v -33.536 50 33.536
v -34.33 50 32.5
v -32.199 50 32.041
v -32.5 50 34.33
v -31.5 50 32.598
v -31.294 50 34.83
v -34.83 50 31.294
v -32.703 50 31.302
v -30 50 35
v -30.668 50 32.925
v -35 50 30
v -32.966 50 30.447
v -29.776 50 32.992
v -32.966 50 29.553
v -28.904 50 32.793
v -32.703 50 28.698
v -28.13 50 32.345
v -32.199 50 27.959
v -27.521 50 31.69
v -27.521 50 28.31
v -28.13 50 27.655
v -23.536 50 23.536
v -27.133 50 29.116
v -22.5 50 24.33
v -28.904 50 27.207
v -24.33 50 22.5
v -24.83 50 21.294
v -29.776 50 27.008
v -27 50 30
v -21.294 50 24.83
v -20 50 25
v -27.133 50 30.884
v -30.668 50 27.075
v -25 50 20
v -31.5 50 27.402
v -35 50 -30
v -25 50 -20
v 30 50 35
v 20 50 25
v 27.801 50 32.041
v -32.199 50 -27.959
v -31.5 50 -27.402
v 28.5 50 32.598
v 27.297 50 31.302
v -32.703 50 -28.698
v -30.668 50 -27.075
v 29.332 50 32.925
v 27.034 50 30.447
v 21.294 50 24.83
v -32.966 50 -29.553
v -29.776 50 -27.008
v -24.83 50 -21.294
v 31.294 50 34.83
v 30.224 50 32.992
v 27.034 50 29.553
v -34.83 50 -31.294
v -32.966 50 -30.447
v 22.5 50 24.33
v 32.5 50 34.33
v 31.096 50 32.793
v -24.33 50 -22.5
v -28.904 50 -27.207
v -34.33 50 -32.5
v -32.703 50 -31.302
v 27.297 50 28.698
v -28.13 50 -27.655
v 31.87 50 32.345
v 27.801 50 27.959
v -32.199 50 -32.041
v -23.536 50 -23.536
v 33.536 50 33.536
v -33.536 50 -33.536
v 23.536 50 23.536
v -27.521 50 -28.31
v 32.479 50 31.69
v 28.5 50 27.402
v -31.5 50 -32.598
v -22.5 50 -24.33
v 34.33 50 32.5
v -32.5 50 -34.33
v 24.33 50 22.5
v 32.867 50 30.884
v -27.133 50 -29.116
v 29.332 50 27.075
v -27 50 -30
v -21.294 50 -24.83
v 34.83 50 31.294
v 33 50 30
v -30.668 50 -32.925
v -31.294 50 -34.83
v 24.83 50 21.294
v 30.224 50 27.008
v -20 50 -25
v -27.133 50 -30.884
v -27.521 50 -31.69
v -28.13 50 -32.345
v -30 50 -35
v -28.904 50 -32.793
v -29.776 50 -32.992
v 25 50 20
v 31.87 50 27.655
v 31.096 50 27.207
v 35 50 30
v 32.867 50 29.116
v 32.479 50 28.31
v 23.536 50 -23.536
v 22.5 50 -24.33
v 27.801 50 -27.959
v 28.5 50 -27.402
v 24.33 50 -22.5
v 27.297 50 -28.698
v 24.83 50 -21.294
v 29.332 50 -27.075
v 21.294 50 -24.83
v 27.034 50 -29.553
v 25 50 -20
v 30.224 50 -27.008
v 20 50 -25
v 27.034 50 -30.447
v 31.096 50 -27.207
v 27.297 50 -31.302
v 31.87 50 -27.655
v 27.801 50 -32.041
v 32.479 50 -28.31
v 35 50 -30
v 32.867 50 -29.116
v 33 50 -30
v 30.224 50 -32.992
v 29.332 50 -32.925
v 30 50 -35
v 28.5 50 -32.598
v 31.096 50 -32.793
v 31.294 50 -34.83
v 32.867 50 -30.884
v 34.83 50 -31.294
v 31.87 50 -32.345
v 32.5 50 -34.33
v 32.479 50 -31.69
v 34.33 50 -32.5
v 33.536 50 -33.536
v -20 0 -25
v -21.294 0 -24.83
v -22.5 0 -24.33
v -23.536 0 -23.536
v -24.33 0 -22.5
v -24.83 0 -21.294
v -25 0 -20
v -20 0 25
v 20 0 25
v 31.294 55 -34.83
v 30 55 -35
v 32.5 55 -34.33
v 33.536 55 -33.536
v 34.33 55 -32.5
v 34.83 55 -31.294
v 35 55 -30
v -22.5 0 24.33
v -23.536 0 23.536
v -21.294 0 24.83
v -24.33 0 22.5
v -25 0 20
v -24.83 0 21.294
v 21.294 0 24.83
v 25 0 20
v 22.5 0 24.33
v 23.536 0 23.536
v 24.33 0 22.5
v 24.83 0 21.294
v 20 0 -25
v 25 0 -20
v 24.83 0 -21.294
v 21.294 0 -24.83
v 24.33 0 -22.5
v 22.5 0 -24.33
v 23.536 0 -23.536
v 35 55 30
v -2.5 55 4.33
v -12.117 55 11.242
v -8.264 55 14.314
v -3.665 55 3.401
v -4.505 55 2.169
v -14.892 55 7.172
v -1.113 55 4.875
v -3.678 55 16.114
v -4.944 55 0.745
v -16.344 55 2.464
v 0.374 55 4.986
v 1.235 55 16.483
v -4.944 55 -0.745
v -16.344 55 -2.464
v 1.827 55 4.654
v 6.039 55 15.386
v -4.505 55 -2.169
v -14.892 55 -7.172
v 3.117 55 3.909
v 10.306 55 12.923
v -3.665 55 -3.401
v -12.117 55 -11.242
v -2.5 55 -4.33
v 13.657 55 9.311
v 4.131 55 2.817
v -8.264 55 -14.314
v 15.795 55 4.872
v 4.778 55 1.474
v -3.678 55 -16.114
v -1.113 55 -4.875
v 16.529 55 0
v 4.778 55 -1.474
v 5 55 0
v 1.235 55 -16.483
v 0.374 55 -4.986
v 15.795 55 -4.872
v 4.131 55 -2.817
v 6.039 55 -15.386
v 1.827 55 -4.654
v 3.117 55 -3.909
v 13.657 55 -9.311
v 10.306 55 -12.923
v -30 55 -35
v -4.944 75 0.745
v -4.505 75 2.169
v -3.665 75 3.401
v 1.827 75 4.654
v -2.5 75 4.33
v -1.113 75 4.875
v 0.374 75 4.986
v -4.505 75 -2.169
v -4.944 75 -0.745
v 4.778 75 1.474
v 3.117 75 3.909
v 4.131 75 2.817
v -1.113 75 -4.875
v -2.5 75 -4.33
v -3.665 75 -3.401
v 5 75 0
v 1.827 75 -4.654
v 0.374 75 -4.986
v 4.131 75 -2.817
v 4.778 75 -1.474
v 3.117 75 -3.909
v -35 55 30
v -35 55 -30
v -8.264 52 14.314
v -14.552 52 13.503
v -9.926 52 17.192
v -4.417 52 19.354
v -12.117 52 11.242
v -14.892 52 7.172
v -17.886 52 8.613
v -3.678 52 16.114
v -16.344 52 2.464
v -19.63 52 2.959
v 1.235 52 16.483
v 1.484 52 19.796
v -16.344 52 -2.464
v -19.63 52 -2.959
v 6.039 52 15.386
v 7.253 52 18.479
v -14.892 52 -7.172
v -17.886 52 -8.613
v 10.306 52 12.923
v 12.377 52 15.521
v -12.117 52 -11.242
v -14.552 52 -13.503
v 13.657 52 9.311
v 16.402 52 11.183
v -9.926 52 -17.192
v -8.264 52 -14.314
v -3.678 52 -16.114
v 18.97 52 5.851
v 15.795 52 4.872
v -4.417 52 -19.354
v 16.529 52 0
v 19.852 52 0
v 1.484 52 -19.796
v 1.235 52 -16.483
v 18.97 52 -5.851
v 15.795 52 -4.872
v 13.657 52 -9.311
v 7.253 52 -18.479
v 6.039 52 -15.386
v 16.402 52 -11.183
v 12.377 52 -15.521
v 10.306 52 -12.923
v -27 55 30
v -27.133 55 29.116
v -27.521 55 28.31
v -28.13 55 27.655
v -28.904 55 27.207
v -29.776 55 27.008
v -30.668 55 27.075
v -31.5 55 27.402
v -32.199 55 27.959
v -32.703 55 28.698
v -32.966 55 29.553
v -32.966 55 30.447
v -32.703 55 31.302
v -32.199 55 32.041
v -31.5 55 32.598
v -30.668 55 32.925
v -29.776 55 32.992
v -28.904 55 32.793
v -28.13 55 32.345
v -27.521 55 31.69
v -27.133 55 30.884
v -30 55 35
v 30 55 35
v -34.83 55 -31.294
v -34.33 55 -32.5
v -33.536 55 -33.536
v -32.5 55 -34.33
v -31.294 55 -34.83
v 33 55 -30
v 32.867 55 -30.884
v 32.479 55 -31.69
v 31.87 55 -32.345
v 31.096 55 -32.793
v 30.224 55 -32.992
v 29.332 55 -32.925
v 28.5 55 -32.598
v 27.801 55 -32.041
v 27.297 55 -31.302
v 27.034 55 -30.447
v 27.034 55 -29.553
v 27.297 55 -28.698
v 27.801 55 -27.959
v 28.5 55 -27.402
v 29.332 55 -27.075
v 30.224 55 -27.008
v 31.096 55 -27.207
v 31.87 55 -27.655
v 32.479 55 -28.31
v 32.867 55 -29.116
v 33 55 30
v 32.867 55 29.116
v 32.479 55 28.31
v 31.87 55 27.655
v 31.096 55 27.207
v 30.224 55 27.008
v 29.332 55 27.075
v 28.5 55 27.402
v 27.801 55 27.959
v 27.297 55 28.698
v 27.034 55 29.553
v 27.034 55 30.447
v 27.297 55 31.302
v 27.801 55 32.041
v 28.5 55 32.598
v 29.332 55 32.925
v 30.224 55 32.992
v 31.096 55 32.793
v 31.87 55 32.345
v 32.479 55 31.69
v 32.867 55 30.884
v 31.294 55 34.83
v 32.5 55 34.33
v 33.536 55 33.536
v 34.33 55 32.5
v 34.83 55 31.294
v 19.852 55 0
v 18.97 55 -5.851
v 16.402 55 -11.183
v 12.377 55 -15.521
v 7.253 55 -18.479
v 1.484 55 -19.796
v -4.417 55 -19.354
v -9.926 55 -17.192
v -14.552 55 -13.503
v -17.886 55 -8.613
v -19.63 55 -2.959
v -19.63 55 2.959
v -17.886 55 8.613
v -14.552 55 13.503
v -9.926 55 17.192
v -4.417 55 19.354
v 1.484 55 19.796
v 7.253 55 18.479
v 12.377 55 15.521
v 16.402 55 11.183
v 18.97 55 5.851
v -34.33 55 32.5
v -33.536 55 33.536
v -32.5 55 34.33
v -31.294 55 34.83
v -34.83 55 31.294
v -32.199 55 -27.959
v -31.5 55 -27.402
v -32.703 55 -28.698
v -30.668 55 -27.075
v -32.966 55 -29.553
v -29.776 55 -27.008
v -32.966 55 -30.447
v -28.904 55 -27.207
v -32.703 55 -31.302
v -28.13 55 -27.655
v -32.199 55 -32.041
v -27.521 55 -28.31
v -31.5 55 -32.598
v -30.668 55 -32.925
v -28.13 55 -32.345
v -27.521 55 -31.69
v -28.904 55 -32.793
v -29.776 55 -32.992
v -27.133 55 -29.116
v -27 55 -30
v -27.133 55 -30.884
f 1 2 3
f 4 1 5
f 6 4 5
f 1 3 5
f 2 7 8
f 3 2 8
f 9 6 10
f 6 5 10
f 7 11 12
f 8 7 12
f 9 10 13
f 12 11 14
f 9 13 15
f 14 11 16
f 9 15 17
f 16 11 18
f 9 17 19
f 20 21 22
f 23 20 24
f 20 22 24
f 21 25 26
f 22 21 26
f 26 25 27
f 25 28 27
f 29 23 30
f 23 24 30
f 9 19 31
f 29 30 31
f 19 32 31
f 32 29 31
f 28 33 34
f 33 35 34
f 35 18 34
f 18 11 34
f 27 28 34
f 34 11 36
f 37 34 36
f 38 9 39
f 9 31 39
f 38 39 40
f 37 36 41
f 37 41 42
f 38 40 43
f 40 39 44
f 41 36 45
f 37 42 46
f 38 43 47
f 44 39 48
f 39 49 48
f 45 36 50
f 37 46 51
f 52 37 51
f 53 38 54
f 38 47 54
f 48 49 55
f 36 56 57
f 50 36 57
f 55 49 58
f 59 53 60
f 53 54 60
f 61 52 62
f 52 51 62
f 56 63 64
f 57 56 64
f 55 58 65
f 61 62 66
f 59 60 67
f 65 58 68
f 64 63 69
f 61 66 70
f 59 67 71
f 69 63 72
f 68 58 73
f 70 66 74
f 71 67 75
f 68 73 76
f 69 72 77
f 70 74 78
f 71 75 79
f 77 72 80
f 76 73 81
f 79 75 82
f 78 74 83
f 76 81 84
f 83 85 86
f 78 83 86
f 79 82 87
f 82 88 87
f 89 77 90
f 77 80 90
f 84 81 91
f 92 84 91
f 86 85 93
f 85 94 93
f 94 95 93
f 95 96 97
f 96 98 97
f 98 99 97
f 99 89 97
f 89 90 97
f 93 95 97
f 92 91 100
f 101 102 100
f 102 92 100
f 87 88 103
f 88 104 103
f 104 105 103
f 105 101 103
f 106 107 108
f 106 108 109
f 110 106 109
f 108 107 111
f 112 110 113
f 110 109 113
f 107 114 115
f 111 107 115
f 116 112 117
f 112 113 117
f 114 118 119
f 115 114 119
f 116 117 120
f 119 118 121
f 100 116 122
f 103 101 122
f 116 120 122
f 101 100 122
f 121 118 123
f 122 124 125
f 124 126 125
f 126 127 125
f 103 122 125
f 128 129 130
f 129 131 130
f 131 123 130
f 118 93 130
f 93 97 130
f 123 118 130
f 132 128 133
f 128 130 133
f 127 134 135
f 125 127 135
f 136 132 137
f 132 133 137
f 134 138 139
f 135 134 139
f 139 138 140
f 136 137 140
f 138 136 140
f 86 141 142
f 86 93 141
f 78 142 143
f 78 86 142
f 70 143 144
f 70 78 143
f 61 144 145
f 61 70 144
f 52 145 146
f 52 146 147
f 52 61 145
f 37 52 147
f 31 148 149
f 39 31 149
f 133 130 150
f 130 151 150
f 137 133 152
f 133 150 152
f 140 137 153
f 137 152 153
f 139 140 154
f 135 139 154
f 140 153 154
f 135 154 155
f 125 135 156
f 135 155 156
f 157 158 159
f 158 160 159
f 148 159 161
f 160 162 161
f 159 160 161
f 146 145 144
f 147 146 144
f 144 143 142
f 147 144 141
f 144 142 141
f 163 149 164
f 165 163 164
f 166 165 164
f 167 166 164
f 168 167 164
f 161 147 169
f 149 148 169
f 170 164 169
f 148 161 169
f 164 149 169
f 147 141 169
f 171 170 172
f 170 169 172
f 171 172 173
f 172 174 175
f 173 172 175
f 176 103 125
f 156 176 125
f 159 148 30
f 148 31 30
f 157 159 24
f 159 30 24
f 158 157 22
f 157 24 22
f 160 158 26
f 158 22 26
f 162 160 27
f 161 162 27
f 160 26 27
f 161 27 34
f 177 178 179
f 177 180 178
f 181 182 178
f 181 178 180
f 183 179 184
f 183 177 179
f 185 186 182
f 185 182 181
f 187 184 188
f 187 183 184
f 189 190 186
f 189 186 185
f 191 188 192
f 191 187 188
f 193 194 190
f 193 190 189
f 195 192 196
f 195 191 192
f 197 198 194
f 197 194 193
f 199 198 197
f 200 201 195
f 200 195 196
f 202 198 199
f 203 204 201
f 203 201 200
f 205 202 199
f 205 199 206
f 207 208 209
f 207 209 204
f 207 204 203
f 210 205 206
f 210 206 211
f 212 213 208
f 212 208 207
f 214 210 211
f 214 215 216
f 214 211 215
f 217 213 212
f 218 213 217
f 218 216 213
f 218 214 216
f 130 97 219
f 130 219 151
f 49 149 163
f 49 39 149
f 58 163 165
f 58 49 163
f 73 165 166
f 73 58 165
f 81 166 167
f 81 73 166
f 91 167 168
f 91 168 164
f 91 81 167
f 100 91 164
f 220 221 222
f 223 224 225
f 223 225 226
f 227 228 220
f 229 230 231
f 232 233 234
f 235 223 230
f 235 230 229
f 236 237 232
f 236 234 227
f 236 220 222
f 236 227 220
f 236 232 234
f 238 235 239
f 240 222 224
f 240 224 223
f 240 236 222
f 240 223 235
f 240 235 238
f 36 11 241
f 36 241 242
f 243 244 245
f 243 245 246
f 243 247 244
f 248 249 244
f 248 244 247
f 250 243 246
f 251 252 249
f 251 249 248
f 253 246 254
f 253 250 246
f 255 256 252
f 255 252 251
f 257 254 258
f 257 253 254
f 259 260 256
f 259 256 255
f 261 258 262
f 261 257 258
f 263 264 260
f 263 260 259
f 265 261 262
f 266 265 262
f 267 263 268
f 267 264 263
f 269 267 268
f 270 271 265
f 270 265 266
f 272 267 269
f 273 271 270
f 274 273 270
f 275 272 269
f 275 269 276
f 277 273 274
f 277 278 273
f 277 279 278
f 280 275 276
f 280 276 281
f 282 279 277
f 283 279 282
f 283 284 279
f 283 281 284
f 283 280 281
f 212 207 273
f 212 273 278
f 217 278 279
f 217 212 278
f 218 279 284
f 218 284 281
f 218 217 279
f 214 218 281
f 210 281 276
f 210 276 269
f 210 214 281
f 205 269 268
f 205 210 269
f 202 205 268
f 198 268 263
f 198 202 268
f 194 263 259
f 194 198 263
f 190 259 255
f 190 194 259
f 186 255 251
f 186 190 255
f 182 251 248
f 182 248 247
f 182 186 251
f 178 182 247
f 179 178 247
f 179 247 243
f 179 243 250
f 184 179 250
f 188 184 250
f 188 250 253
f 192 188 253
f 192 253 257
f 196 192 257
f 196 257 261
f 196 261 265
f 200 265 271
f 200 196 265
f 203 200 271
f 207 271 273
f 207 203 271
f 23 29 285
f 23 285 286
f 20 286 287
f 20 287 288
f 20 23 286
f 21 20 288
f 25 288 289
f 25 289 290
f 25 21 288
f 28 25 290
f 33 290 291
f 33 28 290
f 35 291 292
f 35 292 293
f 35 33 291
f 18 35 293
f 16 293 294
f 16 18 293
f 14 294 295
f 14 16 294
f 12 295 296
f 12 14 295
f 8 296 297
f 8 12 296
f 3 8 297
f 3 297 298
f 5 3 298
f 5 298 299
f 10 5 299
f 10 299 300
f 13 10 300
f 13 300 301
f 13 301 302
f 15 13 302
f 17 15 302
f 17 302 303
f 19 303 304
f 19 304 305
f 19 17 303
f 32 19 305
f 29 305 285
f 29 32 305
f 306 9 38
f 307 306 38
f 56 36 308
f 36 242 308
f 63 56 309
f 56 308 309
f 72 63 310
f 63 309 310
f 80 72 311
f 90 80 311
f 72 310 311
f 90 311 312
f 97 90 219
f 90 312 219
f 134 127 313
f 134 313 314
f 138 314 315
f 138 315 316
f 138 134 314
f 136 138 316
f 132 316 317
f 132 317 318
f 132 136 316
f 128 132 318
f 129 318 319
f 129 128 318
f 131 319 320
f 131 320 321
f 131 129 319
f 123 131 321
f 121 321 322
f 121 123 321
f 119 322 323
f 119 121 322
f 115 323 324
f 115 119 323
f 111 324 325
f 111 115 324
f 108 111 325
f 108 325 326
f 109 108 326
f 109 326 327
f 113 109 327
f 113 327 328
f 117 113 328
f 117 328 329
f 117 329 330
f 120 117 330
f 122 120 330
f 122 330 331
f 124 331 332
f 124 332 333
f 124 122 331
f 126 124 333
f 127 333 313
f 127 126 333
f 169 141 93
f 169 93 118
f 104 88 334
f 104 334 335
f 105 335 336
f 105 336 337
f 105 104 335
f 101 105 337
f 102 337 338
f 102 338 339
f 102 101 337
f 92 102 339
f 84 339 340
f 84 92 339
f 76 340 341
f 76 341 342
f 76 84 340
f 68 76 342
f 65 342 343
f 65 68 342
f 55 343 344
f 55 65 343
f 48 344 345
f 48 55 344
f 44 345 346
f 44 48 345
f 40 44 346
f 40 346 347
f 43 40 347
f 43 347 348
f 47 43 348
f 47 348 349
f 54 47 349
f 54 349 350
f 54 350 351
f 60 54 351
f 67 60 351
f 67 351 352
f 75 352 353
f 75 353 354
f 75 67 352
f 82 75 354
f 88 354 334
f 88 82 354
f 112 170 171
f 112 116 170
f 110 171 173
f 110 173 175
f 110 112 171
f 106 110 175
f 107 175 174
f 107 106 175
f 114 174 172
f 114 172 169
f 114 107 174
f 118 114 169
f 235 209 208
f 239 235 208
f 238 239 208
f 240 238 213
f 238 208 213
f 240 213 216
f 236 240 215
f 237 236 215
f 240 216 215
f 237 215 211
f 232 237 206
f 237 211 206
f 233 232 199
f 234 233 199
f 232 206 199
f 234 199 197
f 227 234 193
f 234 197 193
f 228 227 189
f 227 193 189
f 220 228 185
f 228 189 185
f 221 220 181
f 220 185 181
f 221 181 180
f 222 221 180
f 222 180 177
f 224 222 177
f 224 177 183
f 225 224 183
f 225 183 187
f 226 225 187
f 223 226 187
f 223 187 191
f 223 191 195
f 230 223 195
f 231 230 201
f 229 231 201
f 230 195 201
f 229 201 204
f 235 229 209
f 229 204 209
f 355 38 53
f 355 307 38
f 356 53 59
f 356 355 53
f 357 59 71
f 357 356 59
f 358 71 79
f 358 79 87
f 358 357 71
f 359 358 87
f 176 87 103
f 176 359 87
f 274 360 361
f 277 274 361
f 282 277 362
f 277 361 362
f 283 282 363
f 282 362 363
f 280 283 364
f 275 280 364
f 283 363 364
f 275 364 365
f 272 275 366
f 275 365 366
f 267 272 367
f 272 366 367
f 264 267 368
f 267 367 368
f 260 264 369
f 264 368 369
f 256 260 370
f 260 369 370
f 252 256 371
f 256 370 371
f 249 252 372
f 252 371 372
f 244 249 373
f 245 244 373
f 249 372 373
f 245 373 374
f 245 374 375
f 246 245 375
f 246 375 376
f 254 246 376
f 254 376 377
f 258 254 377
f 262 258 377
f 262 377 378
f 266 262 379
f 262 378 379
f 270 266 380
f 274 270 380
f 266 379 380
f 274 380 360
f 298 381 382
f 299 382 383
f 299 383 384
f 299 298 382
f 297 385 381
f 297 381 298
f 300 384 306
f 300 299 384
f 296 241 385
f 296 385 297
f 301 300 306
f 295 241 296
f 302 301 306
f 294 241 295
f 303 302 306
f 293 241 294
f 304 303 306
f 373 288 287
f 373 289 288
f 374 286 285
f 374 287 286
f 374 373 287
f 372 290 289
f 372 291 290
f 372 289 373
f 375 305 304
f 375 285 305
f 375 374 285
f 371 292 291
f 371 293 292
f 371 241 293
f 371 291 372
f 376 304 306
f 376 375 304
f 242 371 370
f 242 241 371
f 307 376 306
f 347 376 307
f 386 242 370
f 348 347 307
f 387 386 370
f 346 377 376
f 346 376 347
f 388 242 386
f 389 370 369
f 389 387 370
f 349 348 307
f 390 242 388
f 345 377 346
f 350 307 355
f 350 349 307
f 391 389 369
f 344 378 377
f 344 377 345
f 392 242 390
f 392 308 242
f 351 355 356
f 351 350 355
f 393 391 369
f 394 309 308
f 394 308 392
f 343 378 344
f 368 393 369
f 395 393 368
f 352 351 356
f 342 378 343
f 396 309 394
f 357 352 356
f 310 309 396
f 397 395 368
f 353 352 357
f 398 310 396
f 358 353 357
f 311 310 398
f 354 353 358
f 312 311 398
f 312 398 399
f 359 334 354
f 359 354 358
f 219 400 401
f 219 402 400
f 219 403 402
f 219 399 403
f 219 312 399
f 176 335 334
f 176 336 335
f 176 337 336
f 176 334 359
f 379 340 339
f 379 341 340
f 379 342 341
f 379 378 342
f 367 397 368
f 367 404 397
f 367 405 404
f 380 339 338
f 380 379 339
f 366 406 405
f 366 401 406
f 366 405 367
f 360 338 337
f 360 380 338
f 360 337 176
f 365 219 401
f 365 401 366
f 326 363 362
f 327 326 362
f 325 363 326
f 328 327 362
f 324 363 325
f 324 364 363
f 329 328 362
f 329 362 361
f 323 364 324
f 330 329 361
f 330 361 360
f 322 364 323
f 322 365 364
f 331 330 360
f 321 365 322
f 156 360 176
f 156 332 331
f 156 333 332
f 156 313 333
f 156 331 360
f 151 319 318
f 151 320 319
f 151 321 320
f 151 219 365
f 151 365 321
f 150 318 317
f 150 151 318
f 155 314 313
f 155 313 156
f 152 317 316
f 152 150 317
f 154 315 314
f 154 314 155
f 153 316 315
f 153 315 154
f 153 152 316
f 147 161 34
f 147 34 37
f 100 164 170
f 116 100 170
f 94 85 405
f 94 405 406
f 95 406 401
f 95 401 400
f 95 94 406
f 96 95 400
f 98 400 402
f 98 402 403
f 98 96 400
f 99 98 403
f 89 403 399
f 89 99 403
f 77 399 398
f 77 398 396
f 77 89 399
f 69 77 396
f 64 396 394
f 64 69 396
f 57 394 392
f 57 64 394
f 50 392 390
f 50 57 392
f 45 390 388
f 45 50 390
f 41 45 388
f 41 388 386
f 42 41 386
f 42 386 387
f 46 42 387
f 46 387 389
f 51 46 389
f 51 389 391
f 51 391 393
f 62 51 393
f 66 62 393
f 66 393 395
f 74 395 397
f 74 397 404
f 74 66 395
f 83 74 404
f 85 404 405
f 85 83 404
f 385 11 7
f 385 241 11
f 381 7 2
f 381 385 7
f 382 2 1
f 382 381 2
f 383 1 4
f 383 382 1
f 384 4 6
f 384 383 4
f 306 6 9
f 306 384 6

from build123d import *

# Parameters (mm, degrees)
SKETCH1_W           = 50
SKETCH1_H           = 50
BOSS_EXTRUDE1_DEPTH = 50
SKETCH2_W           = 70
SKETCH2_H           = 70
SKETCH2_R           = 3
BOSS_EXTRUDE2_DEPTH = 5
FILLET1_R           = 5
FILLET2_R           = 5
SKETCH3_R           = 19.851731711
SKETCH3_R_2         = 16.528882373
CUT_EXTRUDE1_DEPTH  = 3
SKETCH4_R           = 5
BOSS_EXTRUDE3_DEPTH = 20


with BuildPart() as part:
    # Sketch1 → Boss-Extrude1 (new body)
    with BuildSketch(Plane(origin=(0, 0, 0), x_dir=(1, 0, 0), z_dir=(0, 1, 0))):
        Rectangle(SKETCH1_W, SKETCH1_H)
    extrude(amount=BOSS_EXTRUDE1_DEPTH)

    # Sketch2 → Boss-Extrude2 (add)
    with BuildSketch(Plane(origin=(0, 50, 0), x_dir=(1, 0, 0), z_dir=(0, 1, 0))):
        Rectangle(SKETCH2_W, SKETCH2_H)
        with Locations((-30, 30)):
            Circle(SKETCH2_R, mode=Mode.SUBTRACT)
        with Locations((30, 30)):
            Circle(SKETCH2_R, mode=Mode.SUBTRACT)
        with Locations((-30, -30)):
            Circle(SKETCH2_R, mode=Mode.SUBTRACT)
        with Locations((30, -30)):
            Circle(SKETCH2_R, mode=Mode.SUBTRACT)
    extrude(amount=BOSS_EXTRUDE2_DEPTH)

    # Fillet1
    fillet1_edges = [part.edges().sort_by_distance(p)[0] for p in [
        (25, 25, 25),
        (-25, 25, 25),
        (-25, 25, -25),
        (25, 25, -25),
    ]]
    fillet(fillet1_edges, radius=FILLET1_R)

    # Fillet2
    fillet2_edges = [part.edges().sort_by_distance(p)[0] for p in [
        (35, 52.5, 35),
        (35, 52.5, -35),
        (-35, 52.5, -35),
        (-35, 52.5, 35),
    ]]
    fillet(fillet2_edges, radius=FILLET2_R)

    # Sketch3 → Cut-Extrude1 (cut)
    with BuildSketch(Plane(origin=(0, 55, 0), x_dir=(1, 0, 0), z_dir=(0, 1, 0))):
        Circle(SKETCH3_R)
        Circle(SKETCH3_R_2, mode=Mode.SUBTRACT)
    extrude(amount=-CUT_EXTRUDE1_DEPTH, mode=Mode.SUBTRACT)

    # Sketch4 → Boss-Extrude3 (add)
    with BuildSketch(Plane(origin=(0, 55, 0), x_dir=(1, 0, 0), z_dir=(0, 1, 0))):
        Circle(SKETCH4_R)
    extrude(amount=BOSS_EXTRUDE3_DEPTH)


solid = part.part
